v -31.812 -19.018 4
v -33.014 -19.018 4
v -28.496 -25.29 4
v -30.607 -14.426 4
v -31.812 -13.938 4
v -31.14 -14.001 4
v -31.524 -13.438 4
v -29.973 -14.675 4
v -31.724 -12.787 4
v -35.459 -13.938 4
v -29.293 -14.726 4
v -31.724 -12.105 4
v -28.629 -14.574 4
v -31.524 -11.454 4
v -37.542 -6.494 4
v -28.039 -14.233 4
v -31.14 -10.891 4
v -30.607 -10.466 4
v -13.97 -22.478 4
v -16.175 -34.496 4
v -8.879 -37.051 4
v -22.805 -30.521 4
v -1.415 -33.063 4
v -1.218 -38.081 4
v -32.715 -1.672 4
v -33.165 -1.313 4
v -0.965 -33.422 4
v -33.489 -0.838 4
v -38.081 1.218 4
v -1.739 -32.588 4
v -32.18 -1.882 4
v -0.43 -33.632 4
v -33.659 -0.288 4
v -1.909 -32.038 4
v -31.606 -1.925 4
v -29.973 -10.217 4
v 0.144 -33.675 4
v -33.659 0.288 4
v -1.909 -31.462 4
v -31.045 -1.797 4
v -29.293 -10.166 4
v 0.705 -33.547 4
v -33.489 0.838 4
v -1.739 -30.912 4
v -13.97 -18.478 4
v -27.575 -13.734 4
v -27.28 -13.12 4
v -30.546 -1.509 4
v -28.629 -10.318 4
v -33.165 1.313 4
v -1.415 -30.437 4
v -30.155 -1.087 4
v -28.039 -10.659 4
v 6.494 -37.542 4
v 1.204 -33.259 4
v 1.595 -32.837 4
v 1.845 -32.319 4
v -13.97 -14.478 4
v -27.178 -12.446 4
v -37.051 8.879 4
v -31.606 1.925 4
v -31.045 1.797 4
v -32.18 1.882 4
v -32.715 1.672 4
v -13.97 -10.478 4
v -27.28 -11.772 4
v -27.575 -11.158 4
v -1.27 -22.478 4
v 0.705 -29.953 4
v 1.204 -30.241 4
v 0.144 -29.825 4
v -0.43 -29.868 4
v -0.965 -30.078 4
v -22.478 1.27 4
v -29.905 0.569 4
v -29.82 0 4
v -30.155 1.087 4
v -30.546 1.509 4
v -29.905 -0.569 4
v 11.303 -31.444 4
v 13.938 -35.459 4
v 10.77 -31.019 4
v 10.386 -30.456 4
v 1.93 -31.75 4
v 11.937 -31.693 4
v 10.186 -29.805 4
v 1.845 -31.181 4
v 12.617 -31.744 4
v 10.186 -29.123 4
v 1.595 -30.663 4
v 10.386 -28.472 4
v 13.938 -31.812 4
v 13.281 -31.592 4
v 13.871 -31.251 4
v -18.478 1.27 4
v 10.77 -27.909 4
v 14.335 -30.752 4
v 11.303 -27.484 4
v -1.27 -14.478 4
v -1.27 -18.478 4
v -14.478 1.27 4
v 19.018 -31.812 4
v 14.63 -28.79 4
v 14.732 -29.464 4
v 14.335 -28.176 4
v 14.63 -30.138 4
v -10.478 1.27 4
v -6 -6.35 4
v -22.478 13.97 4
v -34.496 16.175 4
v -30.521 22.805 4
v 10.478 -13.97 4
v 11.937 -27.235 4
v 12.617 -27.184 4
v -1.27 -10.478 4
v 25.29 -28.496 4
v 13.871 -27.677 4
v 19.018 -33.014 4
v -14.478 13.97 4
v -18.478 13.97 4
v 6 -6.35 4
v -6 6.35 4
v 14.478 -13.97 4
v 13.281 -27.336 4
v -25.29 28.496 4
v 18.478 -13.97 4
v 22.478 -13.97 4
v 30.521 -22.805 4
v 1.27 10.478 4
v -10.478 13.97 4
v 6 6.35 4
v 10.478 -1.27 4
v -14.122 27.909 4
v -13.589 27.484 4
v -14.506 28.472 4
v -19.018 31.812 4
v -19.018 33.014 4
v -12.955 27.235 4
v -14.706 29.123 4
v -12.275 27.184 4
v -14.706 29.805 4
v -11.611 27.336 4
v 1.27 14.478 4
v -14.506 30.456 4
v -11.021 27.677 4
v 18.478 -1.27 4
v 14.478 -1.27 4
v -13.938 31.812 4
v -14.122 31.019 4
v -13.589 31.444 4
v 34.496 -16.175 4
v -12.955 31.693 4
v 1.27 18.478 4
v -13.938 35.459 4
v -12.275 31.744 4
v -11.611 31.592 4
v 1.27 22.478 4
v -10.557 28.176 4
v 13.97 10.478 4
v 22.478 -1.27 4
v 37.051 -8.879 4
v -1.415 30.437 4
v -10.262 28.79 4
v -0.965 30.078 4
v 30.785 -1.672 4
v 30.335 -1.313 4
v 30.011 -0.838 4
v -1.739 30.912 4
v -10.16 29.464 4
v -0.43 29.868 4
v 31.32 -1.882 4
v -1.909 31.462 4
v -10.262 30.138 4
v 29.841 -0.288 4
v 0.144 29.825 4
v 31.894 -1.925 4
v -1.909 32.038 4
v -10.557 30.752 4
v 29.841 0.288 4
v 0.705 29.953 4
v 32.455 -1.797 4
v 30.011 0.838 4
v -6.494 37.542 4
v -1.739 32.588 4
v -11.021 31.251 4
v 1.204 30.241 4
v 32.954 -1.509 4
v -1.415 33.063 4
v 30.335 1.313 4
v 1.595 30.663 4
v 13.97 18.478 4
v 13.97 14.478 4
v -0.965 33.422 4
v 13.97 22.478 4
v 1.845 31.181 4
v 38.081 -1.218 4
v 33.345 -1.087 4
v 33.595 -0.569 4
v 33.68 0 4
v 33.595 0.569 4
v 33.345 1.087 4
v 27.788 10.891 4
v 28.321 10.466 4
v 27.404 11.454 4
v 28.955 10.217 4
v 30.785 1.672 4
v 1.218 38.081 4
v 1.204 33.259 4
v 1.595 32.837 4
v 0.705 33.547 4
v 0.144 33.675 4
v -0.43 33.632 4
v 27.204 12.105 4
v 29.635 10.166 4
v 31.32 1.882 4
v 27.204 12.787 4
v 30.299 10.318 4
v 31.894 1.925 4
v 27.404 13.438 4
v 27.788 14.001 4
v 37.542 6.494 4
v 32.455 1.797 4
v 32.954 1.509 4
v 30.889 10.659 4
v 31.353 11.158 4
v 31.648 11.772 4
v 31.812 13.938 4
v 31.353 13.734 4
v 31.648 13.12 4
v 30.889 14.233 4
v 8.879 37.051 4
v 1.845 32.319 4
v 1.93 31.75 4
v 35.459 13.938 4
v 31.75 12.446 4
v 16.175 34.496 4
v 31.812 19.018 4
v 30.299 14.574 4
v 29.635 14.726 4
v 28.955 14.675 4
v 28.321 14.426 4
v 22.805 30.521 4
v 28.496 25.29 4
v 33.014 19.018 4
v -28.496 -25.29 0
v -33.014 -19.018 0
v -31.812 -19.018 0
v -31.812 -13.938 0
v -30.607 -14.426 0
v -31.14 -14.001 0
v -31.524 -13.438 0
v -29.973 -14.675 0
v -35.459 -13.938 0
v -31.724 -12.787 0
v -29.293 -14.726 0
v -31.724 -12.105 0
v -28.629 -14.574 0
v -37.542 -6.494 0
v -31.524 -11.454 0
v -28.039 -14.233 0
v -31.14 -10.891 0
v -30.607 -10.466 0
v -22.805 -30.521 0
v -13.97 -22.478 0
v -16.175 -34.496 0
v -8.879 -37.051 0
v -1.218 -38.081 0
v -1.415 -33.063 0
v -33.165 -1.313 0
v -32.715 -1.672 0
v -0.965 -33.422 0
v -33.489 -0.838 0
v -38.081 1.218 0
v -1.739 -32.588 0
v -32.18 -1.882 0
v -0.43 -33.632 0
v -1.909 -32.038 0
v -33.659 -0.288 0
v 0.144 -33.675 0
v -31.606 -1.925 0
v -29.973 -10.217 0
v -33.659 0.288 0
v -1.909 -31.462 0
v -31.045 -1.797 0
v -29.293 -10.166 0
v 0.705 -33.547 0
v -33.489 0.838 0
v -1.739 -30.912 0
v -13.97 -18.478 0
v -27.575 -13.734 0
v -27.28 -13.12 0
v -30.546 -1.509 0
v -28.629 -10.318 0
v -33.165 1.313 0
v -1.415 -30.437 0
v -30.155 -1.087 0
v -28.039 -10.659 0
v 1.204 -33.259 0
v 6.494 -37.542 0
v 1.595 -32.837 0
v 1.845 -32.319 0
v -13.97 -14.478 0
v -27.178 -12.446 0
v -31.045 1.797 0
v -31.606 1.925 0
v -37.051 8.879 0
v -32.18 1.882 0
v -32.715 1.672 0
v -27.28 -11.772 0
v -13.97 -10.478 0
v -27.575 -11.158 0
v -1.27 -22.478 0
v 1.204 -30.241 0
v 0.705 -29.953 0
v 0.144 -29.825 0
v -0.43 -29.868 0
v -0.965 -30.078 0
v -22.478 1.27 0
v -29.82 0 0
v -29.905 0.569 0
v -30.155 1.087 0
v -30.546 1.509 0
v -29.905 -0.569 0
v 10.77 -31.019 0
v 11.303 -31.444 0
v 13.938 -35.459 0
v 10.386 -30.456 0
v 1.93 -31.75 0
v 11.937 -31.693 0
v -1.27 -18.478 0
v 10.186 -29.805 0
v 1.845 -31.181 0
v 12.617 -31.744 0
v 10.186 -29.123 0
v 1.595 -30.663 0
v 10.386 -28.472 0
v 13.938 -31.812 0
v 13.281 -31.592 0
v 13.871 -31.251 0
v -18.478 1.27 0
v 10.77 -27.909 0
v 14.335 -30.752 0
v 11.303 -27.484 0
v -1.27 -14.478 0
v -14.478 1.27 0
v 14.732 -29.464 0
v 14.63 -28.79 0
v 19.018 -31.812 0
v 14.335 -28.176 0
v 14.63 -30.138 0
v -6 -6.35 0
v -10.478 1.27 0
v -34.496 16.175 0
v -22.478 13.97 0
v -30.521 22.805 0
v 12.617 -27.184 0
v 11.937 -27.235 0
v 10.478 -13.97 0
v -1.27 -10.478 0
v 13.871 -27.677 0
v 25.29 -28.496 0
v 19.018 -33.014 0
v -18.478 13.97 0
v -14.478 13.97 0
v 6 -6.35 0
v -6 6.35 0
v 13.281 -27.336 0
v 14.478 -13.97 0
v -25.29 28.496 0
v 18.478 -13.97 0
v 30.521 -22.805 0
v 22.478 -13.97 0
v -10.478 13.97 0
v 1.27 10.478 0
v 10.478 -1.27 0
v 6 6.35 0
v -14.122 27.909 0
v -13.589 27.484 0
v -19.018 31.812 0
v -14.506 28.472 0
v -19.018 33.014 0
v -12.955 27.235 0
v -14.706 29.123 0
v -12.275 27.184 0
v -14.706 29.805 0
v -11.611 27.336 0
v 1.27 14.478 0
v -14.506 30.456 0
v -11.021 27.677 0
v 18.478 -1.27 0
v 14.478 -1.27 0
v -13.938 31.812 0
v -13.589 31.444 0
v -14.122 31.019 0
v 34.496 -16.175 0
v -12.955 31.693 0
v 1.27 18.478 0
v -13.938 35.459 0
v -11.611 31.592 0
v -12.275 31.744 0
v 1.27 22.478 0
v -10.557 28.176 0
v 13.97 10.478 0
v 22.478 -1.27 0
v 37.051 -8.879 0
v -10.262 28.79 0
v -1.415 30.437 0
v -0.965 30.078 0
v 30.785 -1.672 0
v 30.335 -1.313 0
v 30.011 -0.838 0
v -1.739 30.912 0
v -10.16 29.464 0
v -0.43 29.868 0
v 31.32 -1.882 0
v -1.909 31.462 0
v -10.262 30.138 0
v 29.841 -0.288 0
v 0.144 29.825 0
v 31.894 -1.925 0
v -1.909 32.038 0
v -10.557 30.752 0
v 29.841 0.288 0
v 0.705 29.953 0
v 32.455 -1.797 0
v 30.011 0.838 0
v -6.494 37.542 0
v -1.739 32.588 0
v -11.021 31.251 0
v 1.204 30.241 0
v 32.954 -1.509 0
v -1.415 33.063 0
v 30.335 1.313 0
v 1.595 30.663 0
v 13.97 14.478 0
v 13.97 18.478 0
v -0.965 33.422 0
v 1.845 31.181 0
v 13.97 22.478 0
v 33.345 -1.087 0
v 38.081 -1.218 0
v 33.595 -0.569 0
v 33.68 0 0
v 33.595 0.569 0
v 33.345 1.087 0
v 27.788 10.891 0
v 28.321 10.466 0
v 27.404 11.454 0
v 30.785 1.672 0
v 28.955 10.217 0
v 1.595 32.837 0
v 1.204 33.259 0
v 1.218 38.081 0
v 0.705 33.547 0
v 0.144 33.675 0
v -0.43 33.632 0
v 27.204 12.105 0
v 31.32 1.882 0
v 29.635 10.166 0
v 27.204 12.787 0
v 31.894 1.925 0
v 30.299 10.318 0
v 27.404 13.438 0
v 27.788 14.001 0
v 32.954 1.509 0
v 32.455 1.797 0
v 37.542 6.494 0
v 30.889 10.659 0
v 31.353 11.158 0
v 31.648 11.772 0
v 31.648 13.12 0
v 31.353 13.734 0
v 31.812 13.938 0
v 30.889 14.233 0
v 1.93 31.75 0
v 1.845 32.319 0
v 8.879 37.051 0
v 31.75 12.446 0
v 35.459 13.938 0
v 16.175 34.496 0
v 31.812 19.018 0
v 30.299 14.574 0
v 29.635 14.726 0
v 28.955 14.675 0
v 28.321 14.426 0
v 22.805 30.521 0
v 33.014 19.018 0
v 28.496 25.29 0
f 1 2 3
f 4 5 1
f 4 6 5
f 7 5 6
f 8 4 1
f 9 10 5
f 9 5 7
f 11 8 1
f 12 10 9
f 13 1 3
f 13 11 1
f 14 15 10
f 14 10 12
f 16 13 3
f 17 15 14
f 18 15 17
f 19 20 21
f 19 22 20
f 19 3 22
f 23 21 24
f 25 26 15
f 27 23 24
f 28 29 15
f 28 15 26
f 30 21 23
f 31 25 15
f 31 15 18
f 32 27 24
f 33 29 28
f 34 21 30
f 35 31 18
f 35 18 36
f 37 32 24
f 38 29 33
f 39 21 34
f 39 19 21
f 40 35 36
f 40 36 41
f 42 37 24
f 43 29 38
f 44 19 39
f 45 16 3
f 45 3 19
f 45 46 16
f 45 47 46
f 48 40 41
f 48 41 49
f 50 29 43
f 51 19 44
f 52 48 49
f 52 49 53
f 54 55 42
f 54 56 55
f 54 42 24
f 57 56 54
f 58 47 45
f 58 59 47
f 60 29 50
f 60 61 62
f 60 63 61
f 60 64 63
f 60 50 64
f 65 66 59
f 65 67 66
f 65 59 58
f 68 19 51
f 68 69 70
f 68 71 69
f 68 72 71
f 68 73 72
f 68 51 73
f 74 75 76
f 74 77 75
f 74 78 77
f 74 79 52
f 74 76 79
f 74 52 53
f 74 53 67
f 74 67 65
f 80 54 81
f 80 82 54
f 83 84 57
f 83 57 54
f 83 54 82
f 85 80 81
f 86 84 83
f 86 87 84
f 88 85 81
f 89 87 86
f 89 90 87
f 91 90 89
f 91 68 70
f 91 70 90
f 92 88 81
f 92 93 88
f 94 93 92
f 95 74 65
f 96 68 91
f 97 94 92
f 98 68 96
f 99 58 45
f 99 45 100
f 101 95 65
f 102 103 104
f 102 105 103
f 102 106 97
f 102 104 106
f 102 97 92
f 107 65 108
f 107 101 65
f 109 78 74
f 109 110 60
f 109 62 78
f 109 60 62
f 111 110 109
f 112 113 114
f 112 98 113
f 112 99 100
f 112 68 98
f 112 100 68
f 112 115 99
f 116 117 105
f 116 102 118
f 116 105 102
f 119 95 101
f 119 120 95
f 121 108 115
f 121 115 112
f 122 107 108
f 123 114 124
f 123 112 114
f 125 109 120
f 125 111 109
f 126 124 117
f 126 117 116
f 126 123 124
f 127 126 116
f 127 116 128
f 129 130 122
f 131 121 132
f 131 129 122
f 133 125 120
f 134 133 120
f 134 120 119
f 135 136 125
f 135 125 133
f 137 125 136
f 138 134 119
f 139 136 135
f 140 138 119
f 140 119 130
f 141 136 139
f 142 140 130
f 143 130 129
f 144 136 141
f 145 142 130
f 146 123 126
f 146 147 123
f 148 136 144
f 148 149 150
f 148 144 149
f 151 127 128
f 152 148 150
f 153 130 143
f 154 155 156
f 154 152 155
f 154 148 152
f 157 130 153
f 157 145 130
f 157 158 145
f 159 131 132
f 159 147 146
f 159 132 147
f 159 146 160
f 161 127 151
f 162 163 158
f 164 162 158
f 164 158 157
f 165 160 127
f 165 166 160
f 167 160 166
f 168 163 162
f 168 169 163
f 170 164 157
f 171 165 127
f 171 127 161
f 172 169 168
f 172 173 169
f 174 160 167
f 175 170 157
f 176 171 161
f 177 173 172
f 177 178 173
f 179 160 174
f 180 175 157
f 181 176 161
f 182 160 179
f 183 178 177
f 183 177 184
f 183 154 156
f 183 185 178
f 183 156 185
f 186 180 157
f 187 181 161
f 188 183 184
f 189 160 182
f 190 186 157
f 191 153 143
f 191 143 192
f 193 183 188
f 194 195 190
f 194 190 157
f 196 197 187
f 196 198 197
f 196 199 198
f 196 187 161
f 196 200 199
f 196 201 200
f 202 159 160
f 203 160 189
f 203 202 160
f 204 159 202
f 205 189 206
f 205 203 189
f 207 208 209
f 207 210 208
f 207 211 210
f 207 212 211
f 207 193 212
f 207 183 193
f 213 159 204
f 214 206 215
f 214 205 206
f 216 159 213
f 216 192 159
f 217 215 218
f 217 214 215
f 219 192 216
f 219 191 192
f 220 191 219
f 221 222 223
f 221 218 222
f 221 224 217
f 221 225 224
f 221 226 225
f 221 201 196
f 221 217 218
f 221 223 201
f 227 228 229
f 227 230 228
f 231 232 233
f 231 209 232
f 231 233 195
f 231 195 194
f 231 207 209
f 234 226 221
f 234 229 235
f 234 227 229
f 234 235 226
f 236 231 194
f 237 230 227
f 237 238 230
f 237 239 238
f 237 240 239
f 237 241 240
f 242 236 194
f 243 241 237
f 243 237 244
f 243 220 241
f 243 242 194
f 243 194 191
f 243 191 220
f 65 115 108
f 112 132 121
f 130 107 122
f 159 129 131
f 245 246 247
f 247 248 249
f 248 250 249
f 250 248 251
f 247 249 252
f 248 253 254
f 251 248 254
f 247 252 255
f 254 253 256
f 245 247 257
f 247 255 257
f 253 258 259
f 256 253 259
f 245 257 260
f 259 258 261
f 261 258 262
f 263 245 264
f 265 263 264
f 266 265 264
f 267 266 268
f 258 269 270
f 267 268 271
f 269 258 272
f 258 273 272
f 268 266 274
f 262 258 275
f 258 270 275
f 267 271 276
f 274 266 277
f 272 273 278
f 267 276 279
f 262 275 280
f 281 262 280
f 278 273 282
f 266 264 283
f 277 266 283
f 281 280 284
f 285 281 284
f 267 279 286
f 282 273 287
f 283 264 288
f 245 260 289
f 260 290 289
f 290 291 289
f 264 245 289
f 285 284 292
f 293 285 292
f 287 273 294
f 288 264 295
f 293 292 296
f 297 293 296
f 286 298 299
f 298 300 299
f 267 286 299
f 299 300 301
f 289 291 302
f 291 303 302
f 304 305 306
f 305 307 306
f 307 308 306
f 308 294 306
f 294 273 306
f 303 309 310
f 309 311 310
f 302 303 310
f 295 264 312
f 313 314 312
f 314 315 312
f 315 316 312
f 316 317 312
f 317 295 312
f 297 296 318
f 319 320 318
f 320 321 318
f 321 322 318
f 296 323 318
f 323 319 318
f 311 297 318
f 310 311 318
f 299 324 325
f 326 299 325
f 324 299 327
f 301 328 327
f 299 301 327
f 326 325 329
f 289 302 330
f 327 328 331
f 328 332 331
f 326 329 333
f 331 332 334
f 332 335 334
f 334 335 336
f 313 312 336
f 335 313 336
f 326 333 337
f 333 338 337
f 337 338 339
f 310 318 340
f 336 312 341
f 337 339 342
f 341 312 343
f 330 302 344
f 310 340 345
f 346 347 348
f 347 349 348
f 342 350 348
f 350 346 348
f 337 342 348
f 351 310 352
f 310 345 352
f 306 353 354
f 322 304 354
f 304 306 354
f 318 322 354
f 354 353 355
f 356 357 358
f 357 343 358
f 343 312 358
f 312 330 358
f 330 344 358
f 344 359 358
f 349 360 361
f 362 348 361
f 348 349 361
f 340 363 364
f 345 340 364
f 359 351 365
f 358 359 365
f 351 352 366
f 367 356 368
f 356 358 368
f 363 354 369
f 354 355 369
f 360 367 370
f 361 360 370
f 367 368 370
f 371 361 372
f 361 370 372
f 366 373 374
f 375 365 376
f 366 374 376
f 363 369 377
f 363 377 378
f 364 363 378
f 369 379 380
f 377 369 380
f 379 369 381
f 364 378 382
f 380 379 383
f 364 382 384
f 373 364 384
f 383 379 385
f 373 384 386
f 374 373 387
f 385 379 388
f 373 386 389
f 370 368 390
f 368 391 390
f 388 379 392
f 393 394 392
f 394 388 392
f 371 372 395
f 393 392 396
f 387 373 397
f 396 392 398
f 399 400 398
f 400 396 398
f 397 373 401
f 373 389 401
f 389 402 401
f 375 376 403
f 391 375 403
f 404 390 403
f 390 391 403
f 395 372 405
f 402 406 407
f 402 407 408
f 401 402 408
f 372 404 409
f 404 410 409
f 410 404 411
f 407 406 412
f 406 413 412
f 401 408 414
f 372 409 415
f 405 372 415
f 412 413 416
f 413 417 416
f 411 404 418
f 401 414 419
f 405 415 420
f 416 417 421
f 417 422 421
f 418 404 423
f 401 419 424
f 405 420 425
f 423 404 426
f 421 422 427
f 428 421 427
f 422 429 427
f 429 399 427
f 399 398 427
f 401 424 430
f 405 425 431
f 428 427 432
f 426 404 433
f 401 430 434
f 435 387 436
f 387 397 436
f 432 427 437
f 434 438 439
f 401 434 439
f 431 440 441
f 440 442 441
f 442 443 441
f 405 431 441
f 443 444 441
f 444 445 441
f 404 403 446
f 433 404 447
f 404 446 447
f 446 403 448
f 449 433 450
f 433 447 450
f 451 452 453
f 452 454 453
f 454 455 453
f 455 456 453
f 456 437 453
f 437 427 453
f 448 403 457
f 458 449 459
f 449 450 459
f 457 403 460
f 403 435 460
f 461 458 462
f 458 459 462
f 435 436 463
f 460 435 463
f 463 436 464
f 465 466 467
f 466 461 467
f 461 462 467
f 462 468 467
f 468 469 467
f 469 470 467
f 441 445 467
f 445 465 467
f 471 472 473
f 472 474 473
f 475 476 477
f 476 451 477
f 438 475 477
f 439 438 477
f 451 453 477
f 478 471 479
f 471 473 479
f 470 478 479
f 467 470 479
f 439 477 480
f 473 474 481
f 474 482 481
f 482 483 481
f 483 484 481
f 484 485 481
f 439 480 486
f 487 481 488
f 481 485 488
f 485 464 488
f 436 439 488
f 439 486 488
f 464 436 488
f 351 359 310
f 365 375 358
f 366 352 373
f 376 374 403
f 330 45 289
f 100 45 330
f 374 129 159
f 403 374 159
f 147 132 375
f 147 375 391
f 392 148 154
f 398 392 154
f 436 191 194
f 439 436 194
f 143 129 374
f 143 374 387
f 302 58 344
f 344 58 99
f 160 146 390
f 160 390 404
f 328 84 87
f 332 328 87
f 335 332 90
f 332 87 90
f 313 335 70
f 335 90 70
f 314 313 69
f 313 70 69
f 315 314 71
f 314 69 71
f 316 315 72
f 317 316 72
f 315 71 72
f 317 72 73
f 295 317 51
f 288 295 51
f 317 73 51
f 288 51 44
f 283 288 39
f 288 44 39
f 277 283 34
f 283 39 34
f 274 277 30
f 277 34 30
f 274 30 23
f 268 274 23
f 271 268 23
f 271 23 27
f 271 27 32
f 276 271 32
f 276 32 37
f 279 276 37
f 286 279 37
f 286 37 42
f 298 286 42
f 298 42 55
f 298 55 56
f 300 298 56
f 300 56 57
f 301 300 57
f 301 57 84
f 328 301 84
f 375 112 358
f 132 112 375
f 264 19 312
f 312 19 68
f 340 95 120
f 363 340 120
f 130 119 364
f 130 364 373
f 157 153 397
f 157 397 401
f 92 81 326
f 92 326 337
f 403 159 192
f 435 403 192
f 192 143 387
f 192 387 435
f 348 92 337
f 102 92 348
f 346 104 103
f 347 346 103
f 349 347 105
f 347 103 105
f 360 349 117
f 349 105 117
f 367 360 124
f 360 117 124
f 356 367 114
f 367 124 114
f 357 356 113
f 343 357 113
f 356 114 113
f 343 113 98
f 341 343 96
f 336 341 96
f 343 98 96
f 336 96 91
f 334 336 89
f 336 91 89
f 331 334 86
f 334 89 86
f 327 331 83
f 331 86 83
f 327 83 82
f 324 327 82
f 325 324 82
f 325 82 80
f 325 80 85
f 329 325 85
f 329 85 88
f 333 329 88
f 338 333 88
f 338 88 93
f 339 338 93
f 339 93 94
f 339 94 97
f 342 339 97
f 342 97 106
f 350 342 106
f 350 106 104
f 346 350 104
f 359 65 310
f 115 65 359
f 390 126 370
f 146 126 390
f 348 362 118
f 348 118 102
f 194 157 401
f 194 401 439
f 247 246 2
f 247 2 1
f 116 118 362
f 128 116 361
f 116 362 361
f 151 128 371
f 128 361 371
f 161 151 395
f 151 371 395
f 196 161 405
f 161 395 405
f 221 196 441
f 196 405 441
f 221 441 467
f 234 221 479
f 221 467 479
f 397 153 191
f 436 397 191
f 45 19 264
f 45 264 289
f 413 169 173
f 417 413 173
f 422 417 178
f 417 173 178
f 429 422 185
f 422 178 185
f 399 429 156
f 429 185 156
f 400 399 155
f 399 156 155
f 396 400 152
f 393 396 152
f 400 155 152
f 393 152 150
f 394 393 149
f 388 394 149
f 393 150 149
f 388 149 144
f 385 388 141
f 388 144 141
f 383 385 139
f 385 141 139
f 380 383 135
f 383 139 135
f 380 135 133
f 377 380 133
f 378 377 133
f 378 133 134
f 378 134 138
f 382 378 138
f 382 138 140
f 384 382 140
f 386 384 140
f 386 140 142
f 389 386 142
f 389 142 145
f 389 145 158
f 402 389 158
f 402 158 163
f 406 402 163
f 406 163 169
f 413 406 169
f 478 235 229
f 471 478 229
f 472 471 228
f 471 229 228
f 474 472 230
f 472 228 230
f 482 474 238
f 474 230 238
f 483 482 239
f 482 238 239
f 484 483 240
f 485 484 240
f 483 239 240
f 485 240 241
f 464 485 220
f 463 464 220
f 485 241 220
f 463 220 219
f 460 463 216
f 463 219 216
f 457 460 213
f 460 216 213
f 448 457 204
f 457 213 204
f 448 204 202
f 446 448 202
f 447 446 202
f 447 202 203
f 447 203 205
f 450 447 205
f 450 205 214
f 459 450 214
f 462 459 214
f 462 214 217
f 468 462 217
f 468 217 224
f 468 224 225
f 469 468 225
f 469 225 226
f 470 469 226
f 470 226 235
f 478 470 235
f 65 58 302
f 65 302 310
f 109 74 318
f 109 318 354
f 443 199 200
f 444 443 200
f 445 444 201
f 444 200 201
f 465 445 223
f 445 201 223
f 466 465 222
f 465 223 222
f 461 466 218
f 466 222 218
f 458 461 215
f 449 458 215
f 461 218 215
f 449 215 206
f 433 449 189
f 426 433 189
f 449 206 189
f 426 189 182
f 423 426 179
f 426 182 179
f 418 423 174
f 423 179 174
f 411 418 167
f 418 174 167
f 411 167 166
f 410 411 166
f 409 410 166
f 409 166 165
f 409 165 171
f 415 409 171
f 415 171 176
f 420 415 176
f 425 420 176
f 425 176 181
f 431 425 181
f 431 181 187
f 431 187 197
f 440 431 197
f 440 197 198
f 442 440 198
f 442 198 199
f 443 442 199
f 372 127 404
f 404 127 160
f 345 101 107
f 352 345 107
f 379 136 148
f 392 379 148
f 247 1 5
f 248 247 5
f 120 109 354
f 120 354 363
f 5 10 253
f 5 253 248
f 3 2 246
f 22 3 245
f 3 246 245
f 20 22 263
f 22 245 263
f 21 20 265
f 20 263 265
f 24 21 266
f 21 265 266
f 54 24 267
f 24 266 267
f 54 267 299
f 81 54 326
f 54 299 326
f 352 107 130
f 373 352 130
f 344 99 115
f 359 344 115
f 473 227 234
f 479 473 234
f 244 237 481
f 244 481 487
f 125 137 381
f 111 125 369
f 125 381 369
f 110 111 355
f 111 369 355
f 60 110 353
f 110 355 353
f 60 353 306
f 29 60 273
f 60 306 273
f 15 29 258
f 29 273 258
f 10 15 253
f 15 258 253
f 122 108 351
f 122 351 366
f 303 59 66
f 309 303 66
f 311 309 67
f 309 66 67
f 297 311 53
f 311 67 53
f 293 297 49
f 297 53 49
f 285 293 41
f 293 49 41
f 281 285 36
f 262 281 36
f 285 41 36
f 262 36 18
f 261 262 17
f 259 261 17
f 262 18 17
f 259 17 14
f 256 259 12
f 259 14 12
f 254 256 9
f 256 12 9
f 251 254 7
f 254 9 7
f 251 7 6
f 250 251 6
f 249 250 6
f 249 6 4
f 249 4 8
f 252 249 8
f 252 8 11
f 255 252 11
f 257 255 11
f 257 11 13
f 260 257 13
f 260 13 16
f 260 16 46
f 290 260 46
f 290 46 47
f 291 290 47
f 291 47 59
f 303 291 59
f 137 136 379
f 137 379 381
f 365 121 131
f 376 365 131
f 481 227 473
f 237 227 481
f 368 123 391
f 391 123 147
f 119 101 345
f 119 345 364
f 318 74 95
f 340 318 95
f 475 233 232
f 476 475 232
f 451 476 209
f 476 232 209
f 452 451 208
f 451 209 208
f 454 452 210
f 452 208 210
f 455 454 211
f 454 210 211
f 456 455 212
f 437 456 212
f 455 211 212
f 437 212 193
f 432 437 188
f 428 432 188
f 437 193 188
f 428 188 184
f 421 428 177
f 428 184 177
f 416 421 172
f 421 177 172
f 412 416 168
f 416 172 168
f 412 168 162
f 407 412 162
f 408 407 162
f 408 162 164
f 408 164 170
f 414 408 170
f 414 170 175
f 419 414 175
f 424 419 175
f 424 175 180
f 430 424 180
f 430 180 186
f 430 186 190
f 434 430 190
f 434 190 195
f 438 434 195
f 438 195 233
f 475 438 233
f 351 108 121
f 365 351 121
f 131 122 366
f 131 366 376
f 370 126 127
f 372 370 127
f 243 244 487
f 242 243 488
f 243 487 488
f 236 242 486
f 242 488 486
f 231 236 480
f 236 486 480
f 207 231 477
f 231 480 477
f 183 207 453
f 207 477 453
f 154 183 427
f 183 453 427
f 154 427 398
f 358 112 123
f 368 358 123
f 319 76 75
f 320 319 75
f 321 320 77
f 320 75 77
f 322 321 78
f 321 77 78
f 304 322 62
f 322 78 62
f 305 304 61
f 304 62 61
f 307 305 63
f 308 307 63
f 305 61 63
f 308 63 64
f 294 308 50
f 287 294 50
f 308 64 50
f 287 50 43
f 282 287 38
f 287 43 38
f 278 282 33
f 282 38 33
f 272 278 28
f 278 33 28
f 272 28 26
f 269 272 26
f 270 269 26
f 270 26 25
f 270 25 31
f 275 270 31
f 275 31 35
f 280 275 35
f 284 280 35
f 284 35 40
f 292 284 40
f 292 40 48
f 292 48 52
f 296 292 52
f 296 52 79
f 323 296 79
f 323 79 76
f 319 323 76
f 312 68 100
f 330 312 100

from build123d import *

# Parameters (mm, degrees)
SKETCH1_R           = 38.1
BOSS_EXTRUDE1_DEPTH = 4
SKETCH2_R           = 2.286
SKETCH2_W           = 12.7
SKETCH2_H           = 4
SKETCH2_W_2         = 4
SKETCH2_H_2         = 12.7
CUT_EXTRUDE1_DEPTH  = 55.029806589
CUT_EXTRUDE2_REACH  = 56.03
SKETCH3_W           = 12
SKETCH3_H           = 12.7
SKETCH4_R           = 1.9304
CUT_EXTRUDE3_DEPTH  = 55.029806589
CUT_EXTRUDE4_REACH  = 56.03
SKETCH5_W           = 5.08
SKETCH5_H           = 5.08


with BuildPart() as part:
    # Sketch1 → Boss-Extrude1 (new body)
    with BuildSketch(Plane.XY):
        Circle(SKETCH1_R)
    extrude(amount=BOSS_EXTRUDE1_DEPTH)

    # Sketch2 → Cut-Extrude1 (cut, through all)
    with BuildSketch(Plane.XY.offset(4)):
        with Locations((12.446, -29.464)):
            Circle(SKETCH2_R)
        with Locations((-29.464, -12.446)):
            Circle(SKETCH2_R)
        with Locations((-12.446, 29.464)):
            Circle(SKETCH2_R)
        with Locations((29.464, 12.446)):
            Circle(SKETCH2_R)
        with Locations((-7.62, -12.478)):
            Rectangle(SKETCH2_W, SKETCH2_H)
        with Locations((12.478, -7.62)):
            Rectangle(SKETCH2_W_2, SKETCH2_H_2)
        with Locations((20.478, -7.62)):
            Rectangle(SKETCH2_W_2, SKETCH2_H_2)
        with Locations((-7.62, -20.478)):
            Rectangle(SKETCH2_W, SKETCH2_H)
        with Locations((-12.478, 7.62)):
            Rectangle(SKETCH2_W_2, SKETCH2_H_2)
        with Locations((-20.478, 7.62)):
            Rectangle(SKETCH2_W_2, SKETCH2_H_2)
        with Locations((7.62, 12.478)):
            Rectangle(SKETCH2_W, SKETCH2_H)
        with Locations((7.62, 20.478)):
            Rectangle(SKETCH2_W, SKETCH2_H)
    extrude(amount=-CUT_EXTRUDE1_DEPTH, mode=Mode.SUBTRACT)

    # Sketch3 → Cut-Extrude2 (cut, up to next)
    with BuildSketch(Plane.XY.offset(4), mode=Mode.PRIVATE) as cut_extrude2_sk1:
        Rectangle(SKETCH3_W, SKETCH3_H)
    cut_extrude2_tool1 = extrude(cut_extrude2_sk1.sketch, amount=-CUT_EXTRUDE2_REACH, mode=Mode.PRIVATE) & part.part
    add(cut_extrude2_tool1.solids().sort_by_distance((0, 0, 4))[0], mode=Mode.SUBTRACT)

    # Sketch4 → Cut-Extrude3 (cut, through all)
    with BuildSketch(Plane.XY.offset(4)):
        with Locations((0, -31.75)):
            Circle(SKETCH4_R)
        with Locations((31.75, 0)):
            Circle(SKETCH4_R)
        with Locations((0, 31.75)):
            Circle(SKETCH4_R)
        with Locations((-31.75, 0)):
            Circle(SKETCH4_R)
    extrude(amount=-CUT_EXTRUDE3_DEPTH, mode=Mode.SUBTRACT)

    # Sketch5 → Cut-Extrude4 (cut, up to next)
    with BuildSketch(Plane.XY.offset(4), mode=Mode.PRIVATE) as cut_extrude4_sk1:
        with Locations((34.352372786, 16.478)):
            Rectangle(SKETCH5_W, SKETCH5_H)
    cut_extrude4_tool1 = extrude(cut_extrude4_sk1.sketch, amount=-CUT_EXTRUDE4_REACH, mode=Mode.PRIVATE) & part.part
    # Sketch5 → Cut-Extrude4 (cut, up to next)
    with BuildSketch(Plane.XY.offset(4), mode=Mode.PRIVATE) as cut_extrude4_sk2:
        with Locations((16.478, -34.352372786)):
            Rectangle(SKETCH5_W, SKETCH5_H)
    cut_extrude4_tool2 = extrude(cut_extrude4_sk2.sketch, amount=-CUT_EXTRUDE4_REACH, mode=Mode.PRIVATE) & part.part
    # Sketch5 → Cut-Extrude4 (cut, up to next)
    with BuildSketch(Plane.XY.offset(4), mode=Mode.PRIVATE) as cut_extrude4_sk3:
        with Locations((-34.352372786, -16.478)):
            Rectangle(SKETCH5_W, SKETCH5_H)
    cut_extrude4_tool3 = extrude(cut_extrude4_sk3.sketch, amount=-CUT_EXTRUDE4_REACH, mode=Mode.PRIVATE) & part.part
    # Sketch5 → Cut-Extrude4 (cut, up to next)
    with BuildSketch(Plane.XY.offset(4), mode=Mode.PRIVATE) as cut_extrude4_sk4:
        with Locations((-16.478, 34.352372786)):
            Rectangle(SKETCH5_W, SKETCH5_H)
    cut_extrude4_tool4 = extrude(cut_extrude4_sk4.sketch, amount=-CUT_EXTRUDE4_REACH, mode=Mode.PRIVATE) & part.part
    add(cut_extrude4_tool1.solids().sort_by_distance((34.352373, 16.478, 4))[0], mode=Mode.SUBTRACT)
    add(cut_extrude4_tool2.solids().sort_by_distance((16.478, -34.352373, 4))[0], mode=Mode.SUBTRACT)
    add(cut_extrude4_tool3.solids().sort_by_distance((-34.352373, -16.478, 4))[0], mode=Mode.SUBTRACT)
    add(cut_extrude4_tool4.solids().sort_by_distance((-16.478, 34.352373, 4))[0], mode=Mode.SUBTRACT)


solid = part.part
